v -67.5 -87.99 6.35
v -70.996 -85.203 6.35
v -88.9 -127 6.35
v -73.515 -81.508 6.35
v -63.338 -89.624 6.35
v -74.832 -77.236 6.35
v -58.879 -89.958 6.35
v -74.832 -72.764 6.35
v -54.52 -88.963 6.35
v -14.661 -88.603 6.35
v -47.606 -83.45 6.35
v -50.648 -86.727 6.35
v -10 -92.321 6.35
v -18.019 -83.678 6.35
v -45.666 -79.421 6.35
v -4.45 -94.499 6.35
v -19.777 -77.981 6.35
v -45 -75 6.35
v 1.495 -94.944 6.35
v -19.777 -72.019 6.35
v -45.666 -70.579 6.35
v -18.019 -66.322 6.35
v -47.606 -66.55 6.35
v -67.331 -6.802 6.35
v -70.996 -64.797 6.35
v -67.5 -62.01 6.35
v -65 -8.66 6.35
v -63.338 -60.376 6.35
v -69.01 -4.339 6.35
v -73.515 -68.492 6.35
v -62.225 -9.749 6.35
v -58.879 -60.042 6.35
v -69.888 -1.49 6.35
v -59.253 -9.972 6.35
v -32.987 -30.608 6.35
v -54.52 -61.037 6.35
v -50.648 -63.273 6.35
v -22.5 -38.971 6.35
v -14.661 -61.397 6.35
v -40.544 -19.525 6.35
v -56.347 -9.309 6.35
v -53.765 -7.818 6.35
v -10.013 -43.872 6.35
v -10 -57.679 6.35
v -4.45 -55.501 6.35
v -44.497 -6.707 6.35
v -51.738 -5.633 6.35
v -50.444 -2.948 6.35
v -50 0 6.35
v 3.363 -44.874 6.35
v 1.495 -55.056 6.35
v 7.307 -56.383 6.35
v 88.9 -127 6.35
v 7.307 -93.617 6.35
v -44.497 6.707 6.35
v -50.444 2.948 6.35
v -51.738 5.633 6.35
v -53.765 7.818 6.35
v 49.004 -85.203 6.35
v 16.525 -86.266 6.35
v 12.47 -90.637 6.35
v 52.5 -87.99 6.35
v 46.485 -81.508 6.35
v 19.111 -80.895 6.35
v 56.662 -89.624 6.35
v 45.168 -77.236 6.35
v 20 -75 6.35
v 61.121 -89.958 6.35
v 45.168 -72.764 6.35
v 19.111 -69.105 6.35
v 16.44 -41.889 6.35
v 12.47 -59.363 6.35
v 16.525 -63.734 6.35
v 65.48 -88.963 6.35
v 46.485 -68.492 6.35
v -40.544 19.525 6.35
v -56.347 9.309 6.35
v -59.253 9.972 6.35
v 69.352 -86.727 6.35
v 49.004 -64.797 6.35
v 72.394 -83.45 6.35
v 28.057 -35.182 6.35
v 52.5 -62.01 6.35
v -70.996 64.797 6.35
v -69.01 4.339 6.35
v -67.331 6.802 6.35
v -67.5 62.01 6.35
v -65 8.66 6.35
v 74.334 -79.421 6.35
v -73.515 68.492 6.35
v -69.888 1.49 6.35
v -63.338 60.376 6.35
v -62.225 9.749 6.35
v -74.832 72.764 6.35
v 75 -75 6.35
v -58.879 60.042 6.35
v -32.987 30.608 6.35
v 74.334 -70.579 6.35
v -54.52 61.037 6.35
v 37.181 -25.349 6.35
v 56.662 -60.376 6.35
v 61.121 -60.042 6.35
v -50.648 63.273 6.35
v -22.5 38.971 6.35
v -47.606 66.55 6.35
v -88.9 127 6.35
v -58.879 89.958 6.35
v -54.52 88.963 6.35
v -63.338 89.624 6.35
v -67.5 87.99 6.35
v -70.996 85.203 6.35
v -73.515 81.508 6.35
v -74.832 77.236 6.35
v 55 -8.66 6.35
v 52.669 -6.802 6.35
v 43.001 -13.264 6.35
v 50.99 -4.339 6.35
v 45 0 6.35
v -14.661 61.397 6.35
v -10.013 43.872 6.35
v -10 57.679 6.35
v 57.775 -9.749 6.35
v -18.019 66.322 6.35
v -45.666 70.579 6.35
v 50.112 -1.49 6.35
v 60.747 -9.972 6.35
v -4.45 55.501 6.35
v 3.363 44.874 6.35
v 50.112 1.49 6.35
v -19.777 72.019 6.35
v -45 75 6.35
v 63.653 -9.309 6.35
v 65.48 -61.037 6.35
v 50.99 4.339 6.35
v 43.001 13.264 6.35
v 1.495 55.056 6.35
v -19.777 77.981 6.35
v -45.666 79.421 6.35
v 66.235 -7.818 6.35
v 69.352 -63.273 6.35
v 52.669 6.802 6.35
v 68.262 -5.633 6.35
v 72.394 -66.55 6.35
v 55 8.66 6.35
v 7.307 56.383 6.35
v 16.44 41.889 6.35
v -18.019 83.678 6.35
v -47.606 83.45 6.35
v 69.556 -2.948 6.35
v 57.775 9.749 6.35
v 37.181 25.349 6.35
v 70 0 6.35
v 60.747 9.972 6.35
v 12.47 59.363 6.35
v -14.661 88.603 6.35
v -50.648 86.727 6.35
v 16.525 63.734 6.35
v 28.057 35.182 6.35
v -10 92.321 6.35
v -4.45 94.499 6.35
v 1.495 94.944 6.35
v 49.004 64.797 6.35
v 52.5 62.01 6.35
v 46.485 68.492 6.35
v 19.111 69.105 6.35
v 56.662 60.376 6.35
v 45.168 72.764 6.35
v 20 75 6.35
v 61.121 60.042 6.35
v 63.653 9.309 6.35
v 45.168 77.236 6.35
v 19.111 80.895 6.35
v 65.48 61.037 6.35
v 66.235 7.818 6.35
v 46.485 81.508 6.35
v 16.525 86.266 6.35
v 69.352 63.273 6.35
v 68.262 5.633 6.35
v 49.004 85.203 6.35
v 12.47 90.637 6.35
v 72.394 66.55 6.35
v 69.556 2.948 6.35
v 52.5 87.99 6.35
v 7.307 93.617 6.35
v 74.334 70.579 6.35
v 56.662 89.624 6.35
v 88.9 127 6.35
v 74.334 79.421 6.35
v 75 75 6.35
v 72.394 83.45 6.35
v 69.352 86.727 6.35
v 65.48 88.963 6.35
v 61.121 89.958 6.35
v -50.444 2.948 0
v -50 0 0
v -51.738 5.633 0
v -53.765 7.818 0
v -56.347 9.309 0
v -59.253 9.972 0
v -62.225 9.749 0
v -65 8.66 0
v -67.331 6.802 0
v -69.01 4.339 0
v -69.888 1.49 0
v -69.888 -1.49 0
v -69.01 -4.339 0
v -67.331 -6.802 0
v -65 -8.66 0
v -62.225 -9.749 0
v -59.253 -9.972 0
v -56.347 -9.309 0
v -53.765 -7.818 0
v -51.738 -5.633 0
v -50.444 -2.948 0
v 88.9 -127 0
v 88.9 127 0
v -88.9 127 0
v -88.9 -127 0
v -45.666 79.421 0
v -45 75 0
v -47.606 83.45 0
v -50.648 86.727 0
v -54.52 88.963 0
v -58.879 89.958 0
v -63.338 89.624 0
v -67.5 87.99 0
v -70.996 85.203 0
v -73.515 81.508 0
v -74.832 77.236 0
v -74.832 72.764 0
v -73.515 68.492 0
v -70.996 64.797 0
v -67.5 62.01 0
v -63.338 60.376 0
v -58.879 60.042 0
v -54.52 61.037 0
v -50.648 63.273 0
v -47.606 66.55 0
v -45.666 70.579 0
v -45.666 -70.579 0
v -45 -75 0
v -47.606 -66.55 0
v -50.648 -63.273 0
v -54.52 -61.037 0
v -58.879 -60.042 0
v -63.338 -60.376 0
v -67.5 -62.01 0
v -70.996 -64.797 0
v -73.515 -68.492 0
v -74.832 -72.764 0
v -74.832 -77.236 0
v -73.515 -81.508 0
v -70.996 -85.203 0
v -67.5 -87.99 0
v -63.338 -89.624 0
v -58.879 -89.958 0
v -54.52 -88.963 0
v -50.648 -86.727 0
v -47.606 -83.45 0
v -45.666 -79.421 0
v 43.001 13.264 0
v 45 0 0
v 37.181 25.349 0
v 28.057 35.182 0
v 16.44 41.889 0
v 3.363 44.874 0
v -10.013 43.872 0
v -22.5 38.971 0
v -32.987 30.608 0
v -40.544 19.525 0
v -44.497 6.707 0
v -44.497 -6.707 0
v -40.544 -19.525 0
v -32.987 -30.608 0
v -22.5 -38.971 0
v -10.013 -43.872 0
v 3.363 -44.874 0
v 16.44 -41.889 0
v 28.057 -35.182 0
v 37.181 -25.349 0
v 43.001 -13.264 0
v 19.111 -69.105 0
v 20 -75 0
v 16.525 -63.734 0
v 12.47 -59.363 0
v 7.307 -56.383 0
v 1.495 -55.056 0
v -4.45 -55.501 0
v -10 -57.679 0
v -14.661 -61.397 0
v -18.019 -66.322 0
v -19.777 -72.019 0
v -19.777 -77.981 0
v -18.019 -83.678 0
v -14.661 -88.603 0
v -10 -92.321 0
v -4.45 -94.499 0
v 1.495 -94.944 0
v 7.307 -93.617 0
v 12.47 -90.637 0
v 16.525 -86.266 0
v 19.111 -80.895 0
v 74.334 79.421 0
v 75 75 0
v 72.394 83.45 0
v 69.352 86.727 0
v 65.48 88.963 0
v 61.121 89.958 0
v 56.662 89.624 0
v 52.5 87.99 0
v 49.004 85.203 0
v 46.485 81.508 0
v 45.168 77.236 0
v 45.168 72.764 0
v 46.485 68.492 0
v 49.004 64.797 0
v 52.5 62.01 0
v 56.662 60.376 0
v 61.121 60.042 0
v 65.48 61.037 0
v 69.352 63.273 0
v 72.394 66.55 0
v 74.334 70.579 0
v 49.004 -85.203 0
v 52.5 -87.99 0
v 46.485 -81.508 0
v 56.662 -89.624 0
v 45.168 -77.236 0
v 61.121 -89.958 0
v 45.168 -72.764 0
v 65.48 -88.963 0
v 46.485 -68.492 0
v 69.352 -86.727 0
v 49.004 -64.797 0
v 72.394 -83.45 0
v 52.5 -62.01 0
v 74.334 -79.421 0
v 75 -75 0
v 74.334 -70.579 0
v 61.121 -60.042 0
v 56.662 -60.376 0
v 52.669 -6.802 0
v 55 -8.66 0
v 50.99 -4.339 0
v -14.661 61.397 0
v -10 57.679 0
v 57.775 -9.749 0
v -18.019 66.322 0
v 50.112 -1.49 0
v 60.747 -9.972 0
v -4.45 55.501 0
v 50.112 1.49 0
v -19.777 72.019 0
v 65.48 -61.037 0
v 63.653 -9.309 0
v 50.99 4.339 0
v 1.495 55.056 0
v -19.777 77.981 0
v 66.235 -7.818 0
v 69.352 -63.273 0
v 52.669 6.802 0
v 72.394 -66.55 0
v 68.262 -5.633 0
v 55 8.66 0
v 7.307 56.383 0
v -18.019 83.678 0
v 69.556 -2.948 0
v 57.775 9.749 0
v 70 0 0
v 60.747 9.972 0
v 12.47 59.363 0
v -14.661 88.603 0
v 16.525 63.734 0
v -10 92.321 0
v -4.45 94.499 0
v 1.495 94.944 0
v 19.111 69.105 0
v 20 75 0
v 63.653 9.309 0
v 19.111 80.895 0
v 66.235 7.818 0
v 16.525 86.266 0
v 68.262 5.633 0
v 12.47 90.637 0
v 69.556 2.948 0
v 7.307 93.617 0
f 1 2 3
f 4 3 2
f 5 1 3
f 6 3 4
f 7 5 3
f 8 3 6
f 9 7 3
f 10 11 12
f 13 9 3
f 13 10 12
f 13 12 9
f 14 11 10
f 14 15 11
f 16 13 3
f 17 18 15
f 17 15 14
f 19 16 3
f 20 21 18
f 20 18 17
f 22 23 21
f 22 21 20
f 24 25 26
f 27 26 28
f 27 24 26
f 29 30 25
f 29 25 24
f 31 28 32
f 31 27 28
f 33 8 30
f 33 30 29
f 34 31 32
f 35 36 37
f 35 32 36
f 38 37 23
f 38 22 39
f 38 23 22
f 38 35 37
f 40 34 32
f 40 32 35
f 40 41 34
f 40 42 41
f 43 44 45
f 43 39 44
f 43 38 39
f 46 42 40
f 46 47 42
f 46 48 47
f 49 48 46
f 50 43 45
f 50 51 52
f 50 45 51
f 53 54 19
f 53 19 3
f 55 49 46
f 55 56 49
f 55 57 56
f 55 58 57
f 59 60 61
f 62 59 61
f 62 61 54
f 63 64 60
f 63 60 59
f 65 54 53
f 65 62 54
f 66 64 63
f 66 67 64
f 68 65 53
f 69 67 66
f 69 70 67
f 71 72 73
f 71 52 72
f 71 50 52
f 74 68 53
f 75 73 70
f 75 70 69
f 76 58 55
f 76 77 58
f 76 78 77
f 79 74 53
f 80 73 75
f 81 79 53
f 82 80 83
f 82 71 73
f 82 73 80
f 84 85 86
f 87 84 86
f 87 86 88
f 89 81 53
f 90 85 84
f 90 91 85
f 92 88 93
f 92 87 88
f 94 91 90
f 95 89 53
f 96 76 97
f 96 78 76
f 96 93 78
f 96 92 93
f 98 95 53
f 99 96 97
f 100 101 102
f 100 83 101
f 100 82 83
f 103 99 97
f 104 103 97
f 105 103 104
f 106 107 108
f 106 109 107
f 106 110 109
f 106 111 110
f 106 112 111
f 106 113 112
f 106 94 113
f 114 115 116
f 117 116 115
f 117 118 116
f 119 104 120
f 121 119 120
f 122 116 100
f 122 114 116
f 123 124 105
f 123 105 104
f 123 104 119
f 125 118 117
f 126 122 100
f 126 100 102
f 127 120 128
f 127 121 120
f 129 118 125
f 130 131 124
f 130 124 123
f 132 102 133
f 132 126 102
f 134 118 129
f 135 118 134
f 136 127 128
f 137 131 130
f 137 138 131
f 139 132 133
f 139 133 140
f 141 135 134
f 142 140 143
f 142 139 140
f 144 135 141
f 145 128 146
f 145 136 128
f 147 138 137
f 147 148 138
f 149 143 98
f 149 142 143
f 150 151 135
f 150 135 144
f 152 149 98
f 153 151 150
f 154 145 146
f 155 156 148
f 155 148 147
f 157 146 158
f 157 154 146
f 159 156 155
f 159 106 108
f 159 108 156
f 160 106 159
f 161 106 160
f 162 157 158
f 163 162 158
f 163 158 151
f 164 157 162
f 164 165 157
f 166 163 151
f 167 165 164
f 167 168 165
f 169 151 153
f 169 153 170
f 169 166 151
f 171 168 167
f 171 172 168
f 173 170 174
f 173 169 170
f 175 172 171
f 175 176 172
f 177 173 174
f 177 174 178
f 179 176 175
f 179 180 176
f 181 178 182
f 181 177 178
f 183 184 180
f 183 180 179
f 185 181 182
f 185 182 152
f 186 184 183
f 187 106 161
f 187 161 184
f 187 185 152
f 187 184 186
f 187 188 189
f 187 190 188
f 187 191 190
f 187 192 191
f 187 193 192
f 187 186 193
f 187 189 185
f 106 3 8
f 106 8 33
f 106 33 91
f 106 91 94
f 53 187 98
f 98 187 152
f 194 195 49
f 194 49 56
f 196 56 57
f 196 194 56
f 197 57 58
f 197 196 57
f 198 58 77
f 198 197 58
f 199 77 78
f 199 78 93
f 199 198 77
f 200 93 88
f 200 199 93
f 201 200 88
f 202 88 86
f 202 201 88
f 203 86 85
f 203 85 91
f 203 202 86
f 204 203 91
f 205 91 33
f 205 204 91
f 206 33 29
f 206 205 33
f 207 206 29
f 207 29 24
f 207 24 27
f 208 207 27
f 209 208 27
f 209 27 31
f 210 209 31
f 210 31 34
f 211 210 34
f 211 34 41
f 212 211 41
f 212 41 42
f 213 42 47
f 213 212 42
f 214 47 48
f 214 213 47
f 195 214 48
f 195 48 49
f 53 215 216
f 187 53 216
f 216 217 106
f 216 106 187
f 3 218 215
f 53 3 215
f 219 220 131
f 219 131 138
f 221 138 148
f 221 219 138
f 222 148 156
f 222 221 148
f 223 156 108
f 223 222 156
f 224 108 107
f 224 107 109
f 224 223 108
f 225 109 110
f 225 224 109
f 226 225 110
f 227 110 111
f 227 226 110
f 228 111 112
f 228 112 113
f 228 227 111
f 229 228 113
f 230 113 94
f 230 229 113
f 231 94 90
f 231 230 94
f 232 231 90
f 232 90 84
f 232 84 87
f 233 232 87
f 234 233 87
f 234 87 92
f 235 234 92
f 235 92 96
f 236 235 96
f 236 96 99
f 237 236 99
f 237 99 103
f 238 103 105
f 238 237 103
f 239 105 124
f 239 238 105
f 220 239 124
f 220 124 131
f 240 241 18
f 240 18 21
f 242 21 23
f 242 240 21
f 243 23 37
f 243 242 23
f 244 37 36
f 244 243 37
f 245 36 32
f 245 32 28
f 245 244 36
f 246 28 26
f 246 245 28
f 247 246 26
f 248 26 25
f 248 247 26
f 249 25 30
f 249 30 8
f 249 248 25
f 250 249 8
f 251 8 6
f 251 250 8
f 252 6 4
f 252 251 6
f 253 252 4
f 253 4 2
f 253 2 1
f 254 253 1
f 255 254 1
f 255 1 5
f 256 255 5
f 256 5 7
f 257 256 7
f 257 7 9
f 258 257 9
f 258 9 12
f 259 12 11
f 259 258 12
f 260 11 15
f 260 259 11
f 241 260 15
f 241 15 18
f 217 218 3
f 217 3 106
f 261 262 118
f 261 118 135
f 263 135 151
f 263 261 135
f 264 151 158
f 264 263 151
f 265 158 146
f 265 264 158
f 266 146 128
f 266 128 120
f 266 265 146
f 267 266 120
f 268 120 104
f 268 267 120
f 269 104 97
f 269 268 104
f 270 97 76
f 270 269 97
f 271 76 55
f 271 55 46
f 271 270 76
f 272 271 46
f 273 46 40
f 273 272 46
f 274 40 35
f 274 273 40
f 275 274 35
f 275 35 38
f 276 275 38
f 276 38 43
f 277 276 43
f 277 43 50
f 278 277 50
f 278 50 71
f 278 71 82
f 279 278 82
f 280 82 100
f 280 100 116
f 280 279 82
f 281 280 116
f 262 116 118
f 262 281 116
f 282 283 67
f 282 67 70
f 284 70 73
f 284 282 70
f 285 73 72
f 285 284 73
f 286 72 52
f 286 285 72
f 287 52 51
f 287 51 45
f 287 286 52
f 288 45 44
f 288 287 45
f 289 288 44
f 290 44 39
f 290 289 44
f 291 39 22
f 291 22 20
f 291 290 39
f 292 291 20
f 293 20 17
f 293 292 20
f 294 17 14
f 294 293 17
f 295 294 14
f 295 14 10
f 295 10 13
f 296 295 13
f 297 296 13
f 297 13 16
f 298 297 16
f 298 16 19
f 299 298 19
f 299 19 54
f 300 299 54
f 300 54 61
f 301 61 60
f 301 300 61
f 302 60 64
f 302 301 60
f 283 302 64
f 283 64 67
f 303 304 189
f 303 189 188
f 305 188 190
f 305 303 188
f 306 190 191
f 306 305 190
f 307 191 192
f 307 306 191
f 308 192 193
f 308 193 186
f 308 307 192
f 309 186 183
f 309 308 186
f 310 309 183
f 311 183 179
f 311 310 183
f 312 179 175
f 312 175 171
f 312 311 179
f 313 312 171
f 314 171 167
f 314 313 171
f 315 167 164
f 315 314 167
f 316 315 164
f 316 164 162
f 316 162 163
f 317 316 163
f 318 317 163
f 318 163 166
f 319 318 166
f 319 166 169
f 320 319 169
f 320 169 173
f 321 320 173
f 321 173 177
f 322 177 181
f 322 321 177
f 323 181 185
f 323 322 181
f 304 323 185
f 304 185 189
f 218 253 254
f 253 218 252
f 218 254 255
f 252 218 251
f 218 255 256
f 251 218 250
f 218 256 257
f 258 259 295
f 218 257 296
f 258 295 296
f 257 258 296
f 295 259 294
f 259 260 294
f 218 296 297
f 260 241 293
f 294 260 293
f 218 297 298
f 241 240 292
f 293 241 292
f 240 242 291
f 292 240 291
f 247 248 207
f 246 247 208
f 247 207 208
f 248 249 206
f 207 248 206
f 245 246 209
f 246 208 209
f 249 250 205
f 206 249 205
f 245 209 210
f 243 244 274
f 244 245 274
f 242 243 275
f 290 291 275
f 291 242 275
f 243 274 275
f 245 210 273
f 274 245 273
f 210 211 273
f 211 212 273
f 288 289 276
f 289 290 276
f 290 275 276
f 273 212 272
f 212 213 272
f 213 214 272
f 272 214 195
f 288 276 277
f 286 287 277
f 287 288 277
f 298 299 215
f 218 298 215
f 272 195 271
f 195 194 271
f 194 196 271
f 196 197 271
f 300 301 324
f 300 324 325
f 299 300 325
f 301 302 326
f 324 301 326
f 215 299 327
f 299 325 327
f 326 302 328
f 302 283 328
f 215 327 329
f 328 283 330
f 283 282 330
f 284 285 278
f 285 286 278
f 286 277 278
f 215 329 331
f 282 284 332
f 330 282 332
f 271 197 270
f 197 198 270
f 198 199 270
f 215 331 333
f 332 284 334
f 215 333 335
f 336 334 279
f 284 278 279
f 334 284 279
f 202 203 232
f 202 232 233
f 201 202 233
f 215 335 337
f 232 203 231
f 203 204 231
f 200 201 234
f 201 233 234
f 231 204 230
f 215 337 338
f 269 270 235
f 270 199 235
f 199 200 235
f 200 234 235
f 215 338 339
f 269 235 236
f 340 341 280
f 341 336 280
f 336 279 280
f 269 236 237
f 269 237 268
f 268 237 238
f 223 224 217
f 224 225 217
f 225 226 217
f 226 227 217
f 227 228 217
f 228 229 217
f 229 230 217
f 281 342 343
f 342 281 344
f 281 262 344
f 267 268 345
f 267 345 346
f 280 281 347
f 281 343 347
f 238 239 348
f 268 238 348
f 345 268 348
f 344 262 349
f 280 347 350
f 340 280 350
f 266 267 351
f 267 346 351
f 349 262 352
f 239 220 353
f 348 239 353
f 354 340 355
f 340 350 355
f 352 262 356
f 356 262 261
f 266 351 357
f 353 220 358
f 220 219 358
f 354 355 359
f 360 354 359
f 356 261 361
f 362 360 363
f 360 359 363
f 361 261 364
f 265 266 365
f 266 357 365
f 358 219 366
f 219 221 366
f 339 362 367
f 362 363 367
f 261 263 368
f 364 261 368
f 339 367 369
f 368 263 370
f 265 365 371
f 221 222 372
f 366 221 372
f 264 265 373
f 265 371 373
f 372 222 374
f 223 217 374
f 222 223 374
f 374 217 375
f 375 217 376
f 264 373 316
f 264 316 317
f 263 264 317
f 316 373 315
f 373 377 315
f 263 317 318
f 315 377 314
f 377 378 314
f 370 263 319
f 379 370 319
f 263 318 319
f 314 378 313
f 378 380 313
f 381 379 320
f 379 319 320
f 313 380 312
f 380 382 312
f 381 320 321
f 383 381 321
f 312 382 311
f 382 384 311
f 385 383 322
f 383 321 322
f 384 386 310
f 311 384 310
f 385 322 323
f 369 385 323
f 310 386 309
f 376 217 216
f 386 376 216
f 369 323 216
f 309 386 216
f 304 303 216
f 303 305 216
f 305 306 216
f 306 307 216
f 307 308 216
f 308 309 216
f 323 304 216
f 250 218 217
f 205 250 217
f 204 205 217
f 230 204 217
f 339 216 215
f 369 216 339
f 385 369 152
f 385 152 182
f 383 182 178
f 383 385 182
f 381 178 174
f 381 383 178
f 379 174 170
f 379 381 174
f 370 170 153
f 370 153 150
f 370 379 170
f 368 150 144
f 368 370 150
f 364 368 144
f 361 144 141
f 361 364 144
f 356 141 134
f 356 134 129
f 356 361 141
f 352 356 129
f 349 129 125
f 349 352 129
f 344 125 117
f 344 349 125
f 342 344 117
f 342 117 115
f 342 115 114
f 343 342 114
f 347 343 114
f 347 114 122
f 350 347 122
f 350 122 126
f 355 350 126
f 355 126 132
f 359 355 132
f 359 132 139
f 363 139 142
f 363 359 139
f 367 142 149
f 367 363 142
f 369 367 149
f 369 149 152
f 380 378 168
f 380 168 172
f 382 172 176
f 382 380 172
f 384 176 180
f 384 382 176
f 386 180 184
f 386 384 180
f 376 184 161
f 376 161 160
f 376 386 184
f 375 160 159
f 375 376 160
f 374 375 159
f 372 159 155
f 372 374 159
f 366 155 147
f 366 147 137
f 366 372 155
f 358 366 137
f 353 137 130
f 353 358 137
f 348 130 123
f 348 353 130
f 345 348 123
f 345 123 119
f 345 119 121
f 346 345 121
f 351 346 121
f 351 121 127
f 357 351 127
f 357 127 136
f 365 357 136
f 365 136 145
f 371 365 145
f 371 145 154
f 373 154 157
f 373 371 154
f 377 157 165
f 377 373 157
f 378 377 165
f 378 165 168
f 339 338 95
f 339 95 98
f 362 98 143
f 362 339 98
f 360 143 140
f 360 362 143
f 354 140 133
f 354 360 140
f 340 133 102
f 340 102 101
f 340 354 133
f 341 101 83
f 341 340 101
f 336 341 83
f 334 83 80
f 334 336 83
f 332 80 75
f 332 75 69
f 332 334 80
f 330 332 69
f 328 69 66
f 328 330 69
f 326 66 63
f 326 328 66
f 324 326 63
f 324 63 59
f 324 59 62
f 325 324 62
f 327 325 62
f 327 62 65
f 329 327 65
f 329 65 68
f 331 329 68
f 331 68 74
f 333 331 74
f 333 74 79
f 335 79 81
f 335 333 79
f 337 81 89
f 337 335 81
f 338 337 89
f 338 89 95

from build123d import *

# Parameters (mm, degrees)
F0_W     = 177.8
F0_H     = 254
F0_R     = 15
F0_R_2   = 20
F0_R_3   = 10
F0_R_4   = 45
F1_DEPTH = 6.35


with BuildPart() as f1:
    # F0 (on Top) → F1 (new body)
    with BuildSketch(Plane.XY):
        Rectangle(F0_W, F0_H)
        with Locations((-60, -75)):
            Circle(F0_R, mode=Mode.SUBTRACT)
        with Locations((0, -75)):
            Circle(F0_R_2, mode=Mode.SUBTRACT)
        with Locations((60, -75)):
            Circle(F0_R, mode=Mode.SUBTRACT)
        with Locations((-60, 0)):
            Circle(F0_R_3, mode=Mode.SUBTRACT)
        with Locations((-60, 75)):
            Circle(F0_R, mode=Mode.SUBTRACT)
        Circle(F0_R_4, mode=Mode.SUBTRACT)
        with Locations((60, 0)):
            Circle(F0_R_3, mode=Mode.SUBTRACT)
        with Locations((0, 75)):
            Circle(F0_R_2, mode=Mode.SUBTRACT)
        with Locations((60, 75)):
            Circle(F0_R, mode=Mode.SUBTRACT)
    extrude(amount=F1_DEPTH)


solid = f1.part
